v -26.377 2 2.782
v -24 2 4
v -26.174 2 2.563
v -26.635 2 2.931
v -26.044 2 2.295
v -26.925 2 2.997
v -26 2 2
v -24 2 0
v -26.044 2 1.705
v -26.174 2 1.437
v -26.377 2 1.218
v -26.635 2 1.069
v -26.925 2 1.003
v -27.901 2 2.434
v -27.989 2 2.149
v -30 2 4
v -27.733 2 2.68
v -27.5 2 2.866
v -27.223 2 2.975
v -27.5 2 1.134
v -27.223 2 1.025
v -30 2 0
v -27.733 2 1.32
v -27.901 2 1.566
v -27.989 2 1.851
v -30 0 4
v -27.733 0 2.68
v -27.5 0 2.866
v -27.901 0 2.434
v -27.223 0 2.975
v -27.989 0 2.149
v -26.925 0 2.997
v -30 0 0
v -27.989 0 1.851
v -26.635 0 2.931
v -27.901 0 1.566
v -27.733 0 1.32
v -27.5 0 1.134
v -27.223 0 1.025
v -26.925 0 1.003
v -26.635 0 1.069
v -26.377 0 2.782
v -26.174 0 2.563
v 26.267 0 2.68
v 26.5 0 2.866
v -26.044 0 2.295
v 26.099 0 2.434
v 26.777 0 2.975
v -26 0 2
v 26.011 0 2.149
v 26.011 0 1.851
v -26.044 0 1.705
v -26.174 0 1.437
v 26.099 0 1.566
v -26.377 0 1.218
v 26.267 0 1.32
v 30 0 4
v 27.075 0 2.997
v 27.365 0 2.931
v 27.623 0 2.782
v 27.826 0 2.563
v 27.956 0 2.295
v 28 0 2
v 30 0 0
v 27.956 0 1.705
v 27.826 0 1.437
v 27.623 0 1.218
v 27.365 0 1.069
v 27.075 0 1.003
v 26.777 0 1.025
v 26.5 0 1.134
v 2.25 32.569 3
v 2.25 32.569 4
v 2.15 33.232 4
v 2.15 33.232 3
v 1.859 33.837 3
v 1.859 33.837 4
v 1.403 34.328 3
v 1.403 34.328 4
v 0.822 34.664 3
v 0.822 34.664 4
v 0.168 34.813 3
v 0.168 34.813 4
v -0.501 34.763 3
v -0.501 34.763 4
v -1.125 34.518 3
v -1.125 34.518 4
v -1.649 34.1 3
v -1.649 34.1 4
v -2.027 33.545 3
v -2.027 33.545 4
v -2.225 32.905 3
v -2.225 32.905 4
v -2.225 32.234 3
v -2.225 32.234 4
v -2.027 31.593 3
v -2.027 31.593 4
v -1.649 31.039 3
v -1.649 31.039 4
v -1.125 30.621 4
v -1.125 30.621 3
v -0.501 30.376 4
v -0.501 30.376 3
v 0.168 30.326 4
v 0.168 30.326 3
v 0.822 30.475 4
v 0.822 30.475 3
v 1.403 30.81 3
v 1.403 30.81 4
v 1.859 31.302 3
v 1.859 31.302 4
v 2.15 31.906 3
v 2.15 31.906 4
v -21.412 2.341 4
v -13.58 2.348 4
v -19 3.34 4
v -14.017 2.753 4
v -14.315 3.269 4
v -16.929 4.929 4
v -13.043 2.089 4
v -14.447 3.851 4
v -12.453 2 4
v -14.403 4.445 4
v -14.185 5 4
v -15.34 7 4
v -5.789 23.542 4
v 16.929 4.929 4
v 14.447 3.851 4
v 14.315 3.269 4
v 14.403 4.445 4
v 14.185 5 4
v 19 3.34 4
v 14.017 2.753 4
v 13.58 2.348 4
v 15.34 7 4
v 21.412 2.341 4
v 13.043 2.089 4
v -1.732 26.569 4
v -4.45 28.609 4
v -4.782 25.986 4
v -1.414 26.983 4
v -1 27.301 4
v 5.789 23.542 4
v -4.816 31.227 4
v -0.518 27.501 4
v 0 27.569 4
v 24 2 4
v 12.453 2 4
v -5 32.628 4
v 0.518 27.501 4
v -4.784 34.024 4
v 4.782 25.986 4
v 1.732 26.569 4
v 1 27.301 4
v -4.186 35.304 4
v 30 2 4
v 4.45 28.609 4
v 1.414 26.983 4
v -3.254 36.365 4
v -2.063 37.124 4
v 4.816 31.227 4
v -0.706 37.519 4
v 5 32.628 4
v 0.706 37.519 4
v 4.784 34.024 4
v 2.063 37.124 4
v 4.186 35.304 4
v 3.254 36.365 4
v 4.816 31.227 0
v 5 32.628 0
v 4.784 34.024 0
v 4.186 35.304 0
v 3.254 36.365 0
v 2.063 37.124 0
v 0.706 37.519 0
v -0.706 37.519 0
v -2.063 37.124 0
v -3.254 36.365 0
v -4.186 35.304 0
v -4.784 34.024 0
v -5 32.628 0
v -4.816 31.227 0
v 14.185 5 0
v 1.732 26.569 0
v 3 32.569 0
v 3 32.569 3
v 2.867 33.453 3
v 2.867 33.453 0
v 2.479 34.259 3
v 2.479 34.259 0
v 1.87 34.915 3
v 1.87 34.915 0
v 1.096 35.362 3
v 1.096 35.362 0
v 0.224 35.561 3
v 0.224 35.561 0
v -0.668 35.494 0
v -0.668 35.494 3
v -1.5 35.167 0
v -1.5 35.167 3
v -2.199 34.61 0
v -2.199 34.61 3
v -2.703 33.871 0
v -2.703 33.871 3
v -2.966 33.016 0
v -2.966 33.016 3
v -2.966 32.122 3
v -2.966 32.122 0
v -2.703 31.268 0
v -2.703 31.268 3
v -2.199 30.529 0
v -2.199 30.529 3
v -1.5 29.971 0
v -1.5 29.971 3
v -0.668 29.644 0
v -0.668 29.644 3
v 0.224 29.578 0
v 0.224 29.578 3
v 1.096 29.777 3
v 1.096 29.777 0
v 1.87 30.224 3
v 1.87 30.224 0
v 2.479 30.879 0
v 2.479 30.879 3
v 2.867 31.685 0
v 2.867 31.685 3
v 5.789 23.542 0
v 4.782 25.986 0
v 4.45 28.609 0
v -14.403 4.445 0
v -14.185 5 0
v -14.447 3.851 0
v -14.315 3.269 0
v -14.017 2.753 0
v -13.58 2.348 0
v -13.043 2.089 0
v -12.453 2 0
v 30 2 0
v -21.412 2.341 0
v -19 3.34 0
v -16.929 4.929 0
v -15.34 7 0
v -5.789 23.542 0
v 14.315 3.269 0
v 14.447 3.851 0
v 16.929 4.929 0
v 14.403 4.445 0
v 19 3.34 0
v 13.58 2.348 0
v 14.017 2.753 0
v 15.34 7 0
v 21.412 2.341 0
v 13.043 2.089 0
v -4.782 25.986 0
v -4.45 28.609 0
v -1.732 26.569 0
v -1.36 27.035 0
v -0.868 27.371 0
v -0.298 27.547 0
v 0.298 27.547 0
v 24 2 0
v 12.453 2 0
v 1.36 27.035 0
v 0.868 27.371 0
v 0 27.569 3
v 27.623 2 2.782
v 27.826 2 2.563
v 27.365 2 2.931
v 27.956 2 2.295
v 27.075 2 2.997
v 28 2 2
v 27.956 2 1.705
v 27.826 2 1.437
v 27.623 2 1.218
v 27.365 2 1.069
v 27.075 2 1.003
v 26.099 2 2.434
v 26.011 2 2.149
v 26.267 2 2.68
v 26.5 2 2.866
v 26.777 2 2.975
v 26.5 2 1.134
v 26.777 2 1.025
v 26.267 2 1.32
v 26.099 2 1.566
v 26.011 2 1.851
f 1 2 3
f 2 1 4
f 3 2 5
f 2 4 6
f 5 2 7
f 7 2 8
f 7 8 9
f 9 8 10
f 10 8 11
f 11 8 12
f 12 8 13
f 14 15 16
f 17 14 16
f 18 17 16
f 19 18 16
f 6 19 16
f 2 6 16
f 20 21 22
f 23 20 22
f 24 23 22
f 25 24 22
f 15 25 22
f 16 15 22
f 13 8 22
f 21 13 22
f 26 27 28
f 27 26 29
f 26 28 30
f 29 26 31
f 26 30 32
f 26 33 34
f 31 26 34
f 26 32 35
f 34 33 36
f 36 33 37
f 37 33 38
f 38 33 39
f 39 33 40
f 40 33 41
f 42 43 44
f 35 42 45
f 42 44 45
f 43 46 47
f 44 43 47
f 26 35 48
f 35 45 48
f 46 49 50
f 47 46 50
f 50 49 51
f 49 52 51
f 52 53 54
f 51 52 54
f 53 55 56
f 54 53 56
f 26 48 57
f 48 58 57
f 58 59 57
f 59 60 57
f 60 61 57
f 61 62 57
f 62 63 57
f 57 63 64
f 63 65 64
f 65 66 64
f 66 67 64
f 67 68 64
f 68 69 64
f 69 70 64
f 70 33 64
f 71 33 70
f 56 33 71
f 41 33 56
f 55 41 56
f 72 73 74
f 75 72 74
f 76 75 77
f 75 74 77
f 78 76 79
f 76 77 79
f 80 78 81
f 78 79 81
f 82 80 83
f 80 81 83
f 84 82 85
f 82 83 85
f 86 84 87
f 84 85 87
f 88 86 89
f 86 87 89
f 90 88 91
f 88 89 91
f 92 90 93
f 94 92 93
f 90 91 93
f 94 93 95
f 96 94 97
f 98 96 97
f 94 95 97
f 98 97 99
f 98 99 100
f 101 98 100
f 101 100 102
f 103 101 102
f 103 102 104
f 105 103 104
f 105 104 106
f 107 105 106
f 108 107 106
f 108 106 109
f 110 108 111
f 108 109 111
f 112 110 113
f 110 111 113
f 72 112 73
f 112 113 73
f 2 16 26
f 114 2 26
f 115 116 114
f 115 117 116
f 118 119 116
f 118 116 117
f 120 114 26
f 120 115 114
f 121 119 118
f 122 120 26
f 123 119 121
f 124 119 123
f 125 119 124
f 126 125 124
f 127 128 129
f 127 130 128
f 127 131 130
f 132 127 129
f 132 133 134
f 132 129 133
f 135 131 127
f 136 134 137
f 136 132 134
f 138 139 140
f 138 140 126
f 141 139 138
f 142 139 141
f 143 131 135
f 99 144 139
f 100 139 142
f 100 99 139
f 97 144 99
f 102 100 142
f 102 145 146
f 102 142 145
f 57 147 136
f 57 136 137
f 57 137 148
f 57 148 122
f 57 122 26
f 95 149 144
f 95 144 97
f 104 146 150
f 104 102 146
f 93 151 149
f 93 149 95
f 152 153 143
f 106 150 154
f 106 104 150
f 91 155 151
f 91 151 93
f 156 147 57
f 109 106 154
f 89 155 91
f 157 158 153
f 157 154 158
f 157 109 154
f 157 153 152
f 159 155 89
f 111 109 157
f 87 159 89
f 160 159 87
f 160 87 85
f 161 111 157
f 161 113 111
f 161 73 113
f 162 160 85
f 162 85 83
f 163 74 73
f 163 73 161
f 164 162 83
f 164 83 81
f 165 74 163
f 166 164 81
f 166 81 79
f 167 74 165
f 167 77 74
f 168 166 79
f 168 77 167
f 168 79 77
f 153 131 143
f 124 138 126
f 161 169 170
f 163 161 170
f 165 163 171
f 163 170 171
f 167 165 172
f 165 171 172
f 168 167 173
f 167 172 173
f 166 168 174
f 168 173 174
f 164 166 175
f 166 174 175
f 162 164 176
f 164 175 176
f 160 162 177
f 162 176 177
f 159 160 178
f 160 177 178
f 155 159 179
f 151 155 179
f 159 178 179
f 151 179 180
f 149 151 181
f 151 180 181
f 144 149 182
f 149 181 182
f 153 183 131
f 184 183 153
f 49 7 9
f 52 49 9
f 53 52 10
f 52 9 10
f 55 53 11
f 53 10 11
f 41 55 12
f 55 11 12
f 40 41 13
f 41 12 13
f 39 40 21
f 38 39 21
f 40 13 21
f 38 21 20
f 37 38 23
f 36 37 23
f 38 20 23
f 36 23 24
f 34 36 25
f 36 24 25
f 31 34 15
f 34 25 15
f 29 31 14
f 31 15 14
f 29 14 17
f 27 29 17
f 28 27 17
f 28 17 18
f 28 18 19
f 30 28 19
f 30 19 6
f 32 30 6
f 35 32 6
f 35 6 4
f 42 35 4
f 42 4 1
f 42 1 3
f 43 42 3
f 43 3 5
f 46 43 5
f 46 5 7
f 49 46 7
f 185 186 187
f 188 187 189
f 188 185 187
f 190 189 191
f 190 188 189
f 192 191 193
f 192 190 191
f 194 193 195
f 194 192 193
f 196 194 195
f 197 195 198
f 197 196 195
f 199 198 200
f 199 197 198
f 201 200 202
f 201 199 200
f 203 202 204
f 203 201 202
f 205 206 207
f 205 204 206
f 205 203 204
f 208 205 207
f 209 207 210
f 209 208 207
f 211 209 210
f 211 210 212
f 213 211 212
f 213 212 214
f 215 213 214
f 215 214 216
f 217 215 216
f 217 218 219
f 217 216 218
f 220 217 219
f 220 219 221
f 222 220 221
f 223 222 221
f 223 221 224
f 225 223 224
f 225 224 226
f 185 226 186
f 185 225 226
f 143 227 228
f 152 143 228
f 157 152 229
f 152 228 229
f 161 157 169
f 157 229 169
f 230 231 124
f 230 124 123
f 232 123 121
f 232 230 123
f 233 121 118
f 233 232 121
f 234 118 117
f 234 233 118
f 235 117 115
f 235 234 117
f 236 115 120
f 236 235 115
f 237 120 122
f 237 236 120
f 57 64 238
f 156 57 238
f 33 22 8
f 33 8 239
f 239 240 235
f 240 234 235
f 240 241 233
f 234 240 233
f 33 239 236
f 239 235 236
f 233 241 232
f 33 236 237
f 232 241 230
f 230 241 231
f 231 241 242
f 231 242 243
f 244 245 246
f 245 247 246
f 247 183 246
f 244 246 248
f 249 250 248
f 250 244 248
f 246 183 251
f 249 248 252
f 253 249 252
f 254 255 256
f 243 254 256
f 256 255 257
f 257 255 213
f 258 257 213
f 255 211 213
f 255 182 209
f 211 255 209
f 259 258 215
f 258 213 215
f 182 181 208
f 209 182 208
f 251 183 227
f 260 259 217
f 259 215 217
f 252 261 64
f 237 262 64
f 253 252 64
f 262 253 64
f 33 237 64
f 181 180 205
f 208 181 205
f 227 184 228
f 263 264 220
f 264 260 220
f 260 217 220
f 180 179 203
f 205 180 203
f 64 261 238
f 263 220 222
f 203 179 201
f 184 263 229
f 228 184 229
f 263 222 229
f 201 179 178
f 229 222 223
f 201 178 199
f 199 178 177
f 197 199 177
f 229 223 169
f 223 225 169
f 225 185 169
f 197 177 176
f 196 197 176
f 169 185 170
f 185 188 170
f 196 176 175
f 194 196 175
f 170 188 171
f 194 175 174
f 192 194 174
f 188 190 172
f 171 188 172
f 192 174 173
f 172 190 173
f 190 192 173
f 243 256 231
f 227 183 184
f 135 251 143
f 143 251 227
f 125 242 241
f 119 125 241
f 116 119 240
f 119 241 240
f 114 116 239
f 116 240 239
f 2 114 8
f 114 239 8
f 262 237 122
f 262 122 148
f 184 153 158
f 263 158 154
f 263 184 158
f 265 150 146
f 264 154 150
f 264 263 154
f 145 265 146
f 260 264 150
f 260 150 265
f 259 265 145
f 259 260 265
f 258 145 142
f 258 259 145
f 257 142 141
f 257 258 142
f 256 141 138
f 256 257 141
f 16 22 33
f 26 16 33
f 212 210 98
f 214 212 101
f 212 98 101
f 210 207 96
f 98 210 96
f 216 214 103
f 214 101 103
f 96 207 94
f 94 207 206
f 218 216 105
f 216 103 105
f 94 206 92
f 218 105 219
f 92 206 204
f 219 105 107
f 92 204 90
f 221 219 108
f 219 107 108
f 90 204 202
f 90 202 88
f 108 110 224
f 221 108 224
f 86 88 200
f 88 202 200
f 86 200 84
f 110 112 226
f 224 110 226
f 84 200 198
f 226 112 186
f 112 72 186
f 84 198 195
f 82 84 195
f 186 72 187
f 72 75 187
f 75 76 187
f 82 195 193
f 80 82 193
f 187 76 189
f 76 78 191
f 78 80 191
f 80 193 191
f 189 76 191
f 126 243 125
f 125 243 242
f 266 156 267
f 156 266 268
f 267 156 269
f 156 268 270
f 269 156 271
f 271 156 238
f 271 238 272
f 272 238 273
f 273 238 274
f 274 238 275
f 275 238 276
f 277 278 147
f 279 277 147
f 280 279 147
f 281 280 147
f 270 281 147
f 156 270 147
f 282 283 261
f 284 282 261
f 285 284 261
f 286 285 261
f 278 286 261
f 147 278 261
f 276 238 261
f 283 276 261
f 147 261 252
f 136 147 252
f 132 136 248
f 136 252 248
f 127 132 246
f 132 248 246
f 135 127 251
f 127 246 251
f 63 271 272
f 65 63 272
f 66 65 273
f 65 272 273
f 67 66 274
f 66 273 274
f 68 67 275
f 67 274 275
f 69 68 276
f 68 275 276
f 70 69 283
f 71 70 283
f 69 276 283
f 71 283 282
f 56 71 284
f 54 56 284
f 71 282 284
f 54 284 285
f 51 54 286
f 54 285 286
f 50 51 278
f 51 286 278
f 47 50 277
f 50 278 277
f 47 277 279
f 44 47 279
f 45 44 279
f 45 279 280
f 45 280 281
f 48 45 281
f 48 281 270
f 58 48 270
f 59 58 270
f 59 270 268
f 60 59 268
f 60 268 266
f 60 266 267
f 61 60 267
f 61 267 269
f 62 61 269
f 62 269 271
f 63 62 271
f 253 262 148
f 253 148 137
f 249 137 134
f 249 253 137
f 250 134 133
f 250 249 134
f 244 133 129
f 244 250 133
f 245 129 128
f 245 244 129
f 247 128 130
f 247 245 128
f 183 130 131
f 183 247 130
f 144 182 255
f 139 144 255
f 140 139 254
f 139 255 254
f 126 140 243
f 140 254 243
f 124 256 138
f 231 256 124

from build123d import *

# Parameters (mm, degrees)
ESQUISSE1_R                  = 3
BOSS_EXTRU_2_DEPTH           = 4
ESQUISSE2_R                  = 5
ESQUISSE2_R_2                = 2.25
BOSS_EXTRU_3_DEPTH           = 1
ESQUISSE3_R                  = 1
ENL_V_MAT_EXTRU_2_DEPTH      = 36.569219382
ENL_V_MAT_EXTRU_2_DEPTH_BACK = 3


with BuildPart() as part:
    # Esquisse1 → Boss.-Extru.2 (new body)
    with BuildSketch(Plane.XY):
        with BuildLine():
            Line((-30, 0), (30, 0))
            Line((30, 0), (30, 2))
            Line((30, 2), (24, 2))
            ThreePointArc((24, 2), (19, 3.339745962), (15.339745962, 7))
            Line((15.339745962, 7), (5.789084023, 23.542231724))
            ThreePointArc((5.789084023, 23.542231724), (4.528486677, 27.286561462), (4.81644602, 31.226890162))
            ThreePointArc((4.81644602, 31.226890162), (0, 37.569219382), (-4.81644602, 31.226890162))
            ThreePointArc((-4.81644602, 31.226890162), (-4.528486677, 27.286561462), (-5.789084023, 23.542231724))
            Line((-5.789084023, 23.542231724), (-15.339745962, 7))
            ThreePointArc((-15.339745962, 7), (-19, 3.339745962), (-24, 2))
            Line((-24, 2), (-30, 2))
            Line((-30, 2), (-30, 0))
        make_face()
        with Locations((0, 32.569219382)):
            Circle(ESQUISSE1_R, mode=Mode.SUBTRACT)
        with BuildLine():
            Line((-12.452994616, 2), (12.452994616, 2))
            ThreePointArc((12.452994616, 2), (14.185045424, 3), (14.185045424, 5))
            Line((14.185045424, 5), (1.732050808, 26.569219382))
            ThreePointArc((1.732050808, 26.569219382), (0, 27.569219382), (-1.732050808, 26.569219382))
            Line((-1.732050808, 26.569219382), (-14.185045424, 5))
            ThreePointArc((-14.185045424, 5), (-14.185045424, 3), (-12.452994616, 2))
        make_face(mode=Mode.SUBTRACT)
    extrude(amount=BOSS_EXTRU_2_DEPTH)

    # Esquisse2 → Boss.-Extru.3 (add)
    with BuildSketch(Plane.XY.offset(4)):
        with Locations((0, 32.569219382)):
            Circle(ESQUISSE2_R)
        with Locations((0, 32.569219382)):
            Circle(ESQUISSE2_R_2, mode=Mode.SUBTRACT)
    extrude(amount=-BOSS_EXTRU_3_DEPTH)

    # Esquisse3 → Enlèv. mat.-Extru.2 (cut, two sides)
    with BuildSketch(Plane(origin=(0, 2, 0), x_dir=(1, 0, 0), z_dir=(0, 1, 0))) as enl_v_mat_extru_2_sk:
        with Locations((27, -2)):
            Circle(ESQUISSE3_R)
        with Locations((-27, -2)):
            Circle(ESQUISSE3_R)
    extrude(amount=ENL_V_MAT_EXTRU_2_DEPTH, mode=Mode.SUBTRACT)
    extrude(enl_v_mat_extru_2_sk.sketch, amount=-ENL_V_MAT_EXTRU_2_DEPTH_BACK, mode=Mode.SUBTRACT)


solid = part.part
